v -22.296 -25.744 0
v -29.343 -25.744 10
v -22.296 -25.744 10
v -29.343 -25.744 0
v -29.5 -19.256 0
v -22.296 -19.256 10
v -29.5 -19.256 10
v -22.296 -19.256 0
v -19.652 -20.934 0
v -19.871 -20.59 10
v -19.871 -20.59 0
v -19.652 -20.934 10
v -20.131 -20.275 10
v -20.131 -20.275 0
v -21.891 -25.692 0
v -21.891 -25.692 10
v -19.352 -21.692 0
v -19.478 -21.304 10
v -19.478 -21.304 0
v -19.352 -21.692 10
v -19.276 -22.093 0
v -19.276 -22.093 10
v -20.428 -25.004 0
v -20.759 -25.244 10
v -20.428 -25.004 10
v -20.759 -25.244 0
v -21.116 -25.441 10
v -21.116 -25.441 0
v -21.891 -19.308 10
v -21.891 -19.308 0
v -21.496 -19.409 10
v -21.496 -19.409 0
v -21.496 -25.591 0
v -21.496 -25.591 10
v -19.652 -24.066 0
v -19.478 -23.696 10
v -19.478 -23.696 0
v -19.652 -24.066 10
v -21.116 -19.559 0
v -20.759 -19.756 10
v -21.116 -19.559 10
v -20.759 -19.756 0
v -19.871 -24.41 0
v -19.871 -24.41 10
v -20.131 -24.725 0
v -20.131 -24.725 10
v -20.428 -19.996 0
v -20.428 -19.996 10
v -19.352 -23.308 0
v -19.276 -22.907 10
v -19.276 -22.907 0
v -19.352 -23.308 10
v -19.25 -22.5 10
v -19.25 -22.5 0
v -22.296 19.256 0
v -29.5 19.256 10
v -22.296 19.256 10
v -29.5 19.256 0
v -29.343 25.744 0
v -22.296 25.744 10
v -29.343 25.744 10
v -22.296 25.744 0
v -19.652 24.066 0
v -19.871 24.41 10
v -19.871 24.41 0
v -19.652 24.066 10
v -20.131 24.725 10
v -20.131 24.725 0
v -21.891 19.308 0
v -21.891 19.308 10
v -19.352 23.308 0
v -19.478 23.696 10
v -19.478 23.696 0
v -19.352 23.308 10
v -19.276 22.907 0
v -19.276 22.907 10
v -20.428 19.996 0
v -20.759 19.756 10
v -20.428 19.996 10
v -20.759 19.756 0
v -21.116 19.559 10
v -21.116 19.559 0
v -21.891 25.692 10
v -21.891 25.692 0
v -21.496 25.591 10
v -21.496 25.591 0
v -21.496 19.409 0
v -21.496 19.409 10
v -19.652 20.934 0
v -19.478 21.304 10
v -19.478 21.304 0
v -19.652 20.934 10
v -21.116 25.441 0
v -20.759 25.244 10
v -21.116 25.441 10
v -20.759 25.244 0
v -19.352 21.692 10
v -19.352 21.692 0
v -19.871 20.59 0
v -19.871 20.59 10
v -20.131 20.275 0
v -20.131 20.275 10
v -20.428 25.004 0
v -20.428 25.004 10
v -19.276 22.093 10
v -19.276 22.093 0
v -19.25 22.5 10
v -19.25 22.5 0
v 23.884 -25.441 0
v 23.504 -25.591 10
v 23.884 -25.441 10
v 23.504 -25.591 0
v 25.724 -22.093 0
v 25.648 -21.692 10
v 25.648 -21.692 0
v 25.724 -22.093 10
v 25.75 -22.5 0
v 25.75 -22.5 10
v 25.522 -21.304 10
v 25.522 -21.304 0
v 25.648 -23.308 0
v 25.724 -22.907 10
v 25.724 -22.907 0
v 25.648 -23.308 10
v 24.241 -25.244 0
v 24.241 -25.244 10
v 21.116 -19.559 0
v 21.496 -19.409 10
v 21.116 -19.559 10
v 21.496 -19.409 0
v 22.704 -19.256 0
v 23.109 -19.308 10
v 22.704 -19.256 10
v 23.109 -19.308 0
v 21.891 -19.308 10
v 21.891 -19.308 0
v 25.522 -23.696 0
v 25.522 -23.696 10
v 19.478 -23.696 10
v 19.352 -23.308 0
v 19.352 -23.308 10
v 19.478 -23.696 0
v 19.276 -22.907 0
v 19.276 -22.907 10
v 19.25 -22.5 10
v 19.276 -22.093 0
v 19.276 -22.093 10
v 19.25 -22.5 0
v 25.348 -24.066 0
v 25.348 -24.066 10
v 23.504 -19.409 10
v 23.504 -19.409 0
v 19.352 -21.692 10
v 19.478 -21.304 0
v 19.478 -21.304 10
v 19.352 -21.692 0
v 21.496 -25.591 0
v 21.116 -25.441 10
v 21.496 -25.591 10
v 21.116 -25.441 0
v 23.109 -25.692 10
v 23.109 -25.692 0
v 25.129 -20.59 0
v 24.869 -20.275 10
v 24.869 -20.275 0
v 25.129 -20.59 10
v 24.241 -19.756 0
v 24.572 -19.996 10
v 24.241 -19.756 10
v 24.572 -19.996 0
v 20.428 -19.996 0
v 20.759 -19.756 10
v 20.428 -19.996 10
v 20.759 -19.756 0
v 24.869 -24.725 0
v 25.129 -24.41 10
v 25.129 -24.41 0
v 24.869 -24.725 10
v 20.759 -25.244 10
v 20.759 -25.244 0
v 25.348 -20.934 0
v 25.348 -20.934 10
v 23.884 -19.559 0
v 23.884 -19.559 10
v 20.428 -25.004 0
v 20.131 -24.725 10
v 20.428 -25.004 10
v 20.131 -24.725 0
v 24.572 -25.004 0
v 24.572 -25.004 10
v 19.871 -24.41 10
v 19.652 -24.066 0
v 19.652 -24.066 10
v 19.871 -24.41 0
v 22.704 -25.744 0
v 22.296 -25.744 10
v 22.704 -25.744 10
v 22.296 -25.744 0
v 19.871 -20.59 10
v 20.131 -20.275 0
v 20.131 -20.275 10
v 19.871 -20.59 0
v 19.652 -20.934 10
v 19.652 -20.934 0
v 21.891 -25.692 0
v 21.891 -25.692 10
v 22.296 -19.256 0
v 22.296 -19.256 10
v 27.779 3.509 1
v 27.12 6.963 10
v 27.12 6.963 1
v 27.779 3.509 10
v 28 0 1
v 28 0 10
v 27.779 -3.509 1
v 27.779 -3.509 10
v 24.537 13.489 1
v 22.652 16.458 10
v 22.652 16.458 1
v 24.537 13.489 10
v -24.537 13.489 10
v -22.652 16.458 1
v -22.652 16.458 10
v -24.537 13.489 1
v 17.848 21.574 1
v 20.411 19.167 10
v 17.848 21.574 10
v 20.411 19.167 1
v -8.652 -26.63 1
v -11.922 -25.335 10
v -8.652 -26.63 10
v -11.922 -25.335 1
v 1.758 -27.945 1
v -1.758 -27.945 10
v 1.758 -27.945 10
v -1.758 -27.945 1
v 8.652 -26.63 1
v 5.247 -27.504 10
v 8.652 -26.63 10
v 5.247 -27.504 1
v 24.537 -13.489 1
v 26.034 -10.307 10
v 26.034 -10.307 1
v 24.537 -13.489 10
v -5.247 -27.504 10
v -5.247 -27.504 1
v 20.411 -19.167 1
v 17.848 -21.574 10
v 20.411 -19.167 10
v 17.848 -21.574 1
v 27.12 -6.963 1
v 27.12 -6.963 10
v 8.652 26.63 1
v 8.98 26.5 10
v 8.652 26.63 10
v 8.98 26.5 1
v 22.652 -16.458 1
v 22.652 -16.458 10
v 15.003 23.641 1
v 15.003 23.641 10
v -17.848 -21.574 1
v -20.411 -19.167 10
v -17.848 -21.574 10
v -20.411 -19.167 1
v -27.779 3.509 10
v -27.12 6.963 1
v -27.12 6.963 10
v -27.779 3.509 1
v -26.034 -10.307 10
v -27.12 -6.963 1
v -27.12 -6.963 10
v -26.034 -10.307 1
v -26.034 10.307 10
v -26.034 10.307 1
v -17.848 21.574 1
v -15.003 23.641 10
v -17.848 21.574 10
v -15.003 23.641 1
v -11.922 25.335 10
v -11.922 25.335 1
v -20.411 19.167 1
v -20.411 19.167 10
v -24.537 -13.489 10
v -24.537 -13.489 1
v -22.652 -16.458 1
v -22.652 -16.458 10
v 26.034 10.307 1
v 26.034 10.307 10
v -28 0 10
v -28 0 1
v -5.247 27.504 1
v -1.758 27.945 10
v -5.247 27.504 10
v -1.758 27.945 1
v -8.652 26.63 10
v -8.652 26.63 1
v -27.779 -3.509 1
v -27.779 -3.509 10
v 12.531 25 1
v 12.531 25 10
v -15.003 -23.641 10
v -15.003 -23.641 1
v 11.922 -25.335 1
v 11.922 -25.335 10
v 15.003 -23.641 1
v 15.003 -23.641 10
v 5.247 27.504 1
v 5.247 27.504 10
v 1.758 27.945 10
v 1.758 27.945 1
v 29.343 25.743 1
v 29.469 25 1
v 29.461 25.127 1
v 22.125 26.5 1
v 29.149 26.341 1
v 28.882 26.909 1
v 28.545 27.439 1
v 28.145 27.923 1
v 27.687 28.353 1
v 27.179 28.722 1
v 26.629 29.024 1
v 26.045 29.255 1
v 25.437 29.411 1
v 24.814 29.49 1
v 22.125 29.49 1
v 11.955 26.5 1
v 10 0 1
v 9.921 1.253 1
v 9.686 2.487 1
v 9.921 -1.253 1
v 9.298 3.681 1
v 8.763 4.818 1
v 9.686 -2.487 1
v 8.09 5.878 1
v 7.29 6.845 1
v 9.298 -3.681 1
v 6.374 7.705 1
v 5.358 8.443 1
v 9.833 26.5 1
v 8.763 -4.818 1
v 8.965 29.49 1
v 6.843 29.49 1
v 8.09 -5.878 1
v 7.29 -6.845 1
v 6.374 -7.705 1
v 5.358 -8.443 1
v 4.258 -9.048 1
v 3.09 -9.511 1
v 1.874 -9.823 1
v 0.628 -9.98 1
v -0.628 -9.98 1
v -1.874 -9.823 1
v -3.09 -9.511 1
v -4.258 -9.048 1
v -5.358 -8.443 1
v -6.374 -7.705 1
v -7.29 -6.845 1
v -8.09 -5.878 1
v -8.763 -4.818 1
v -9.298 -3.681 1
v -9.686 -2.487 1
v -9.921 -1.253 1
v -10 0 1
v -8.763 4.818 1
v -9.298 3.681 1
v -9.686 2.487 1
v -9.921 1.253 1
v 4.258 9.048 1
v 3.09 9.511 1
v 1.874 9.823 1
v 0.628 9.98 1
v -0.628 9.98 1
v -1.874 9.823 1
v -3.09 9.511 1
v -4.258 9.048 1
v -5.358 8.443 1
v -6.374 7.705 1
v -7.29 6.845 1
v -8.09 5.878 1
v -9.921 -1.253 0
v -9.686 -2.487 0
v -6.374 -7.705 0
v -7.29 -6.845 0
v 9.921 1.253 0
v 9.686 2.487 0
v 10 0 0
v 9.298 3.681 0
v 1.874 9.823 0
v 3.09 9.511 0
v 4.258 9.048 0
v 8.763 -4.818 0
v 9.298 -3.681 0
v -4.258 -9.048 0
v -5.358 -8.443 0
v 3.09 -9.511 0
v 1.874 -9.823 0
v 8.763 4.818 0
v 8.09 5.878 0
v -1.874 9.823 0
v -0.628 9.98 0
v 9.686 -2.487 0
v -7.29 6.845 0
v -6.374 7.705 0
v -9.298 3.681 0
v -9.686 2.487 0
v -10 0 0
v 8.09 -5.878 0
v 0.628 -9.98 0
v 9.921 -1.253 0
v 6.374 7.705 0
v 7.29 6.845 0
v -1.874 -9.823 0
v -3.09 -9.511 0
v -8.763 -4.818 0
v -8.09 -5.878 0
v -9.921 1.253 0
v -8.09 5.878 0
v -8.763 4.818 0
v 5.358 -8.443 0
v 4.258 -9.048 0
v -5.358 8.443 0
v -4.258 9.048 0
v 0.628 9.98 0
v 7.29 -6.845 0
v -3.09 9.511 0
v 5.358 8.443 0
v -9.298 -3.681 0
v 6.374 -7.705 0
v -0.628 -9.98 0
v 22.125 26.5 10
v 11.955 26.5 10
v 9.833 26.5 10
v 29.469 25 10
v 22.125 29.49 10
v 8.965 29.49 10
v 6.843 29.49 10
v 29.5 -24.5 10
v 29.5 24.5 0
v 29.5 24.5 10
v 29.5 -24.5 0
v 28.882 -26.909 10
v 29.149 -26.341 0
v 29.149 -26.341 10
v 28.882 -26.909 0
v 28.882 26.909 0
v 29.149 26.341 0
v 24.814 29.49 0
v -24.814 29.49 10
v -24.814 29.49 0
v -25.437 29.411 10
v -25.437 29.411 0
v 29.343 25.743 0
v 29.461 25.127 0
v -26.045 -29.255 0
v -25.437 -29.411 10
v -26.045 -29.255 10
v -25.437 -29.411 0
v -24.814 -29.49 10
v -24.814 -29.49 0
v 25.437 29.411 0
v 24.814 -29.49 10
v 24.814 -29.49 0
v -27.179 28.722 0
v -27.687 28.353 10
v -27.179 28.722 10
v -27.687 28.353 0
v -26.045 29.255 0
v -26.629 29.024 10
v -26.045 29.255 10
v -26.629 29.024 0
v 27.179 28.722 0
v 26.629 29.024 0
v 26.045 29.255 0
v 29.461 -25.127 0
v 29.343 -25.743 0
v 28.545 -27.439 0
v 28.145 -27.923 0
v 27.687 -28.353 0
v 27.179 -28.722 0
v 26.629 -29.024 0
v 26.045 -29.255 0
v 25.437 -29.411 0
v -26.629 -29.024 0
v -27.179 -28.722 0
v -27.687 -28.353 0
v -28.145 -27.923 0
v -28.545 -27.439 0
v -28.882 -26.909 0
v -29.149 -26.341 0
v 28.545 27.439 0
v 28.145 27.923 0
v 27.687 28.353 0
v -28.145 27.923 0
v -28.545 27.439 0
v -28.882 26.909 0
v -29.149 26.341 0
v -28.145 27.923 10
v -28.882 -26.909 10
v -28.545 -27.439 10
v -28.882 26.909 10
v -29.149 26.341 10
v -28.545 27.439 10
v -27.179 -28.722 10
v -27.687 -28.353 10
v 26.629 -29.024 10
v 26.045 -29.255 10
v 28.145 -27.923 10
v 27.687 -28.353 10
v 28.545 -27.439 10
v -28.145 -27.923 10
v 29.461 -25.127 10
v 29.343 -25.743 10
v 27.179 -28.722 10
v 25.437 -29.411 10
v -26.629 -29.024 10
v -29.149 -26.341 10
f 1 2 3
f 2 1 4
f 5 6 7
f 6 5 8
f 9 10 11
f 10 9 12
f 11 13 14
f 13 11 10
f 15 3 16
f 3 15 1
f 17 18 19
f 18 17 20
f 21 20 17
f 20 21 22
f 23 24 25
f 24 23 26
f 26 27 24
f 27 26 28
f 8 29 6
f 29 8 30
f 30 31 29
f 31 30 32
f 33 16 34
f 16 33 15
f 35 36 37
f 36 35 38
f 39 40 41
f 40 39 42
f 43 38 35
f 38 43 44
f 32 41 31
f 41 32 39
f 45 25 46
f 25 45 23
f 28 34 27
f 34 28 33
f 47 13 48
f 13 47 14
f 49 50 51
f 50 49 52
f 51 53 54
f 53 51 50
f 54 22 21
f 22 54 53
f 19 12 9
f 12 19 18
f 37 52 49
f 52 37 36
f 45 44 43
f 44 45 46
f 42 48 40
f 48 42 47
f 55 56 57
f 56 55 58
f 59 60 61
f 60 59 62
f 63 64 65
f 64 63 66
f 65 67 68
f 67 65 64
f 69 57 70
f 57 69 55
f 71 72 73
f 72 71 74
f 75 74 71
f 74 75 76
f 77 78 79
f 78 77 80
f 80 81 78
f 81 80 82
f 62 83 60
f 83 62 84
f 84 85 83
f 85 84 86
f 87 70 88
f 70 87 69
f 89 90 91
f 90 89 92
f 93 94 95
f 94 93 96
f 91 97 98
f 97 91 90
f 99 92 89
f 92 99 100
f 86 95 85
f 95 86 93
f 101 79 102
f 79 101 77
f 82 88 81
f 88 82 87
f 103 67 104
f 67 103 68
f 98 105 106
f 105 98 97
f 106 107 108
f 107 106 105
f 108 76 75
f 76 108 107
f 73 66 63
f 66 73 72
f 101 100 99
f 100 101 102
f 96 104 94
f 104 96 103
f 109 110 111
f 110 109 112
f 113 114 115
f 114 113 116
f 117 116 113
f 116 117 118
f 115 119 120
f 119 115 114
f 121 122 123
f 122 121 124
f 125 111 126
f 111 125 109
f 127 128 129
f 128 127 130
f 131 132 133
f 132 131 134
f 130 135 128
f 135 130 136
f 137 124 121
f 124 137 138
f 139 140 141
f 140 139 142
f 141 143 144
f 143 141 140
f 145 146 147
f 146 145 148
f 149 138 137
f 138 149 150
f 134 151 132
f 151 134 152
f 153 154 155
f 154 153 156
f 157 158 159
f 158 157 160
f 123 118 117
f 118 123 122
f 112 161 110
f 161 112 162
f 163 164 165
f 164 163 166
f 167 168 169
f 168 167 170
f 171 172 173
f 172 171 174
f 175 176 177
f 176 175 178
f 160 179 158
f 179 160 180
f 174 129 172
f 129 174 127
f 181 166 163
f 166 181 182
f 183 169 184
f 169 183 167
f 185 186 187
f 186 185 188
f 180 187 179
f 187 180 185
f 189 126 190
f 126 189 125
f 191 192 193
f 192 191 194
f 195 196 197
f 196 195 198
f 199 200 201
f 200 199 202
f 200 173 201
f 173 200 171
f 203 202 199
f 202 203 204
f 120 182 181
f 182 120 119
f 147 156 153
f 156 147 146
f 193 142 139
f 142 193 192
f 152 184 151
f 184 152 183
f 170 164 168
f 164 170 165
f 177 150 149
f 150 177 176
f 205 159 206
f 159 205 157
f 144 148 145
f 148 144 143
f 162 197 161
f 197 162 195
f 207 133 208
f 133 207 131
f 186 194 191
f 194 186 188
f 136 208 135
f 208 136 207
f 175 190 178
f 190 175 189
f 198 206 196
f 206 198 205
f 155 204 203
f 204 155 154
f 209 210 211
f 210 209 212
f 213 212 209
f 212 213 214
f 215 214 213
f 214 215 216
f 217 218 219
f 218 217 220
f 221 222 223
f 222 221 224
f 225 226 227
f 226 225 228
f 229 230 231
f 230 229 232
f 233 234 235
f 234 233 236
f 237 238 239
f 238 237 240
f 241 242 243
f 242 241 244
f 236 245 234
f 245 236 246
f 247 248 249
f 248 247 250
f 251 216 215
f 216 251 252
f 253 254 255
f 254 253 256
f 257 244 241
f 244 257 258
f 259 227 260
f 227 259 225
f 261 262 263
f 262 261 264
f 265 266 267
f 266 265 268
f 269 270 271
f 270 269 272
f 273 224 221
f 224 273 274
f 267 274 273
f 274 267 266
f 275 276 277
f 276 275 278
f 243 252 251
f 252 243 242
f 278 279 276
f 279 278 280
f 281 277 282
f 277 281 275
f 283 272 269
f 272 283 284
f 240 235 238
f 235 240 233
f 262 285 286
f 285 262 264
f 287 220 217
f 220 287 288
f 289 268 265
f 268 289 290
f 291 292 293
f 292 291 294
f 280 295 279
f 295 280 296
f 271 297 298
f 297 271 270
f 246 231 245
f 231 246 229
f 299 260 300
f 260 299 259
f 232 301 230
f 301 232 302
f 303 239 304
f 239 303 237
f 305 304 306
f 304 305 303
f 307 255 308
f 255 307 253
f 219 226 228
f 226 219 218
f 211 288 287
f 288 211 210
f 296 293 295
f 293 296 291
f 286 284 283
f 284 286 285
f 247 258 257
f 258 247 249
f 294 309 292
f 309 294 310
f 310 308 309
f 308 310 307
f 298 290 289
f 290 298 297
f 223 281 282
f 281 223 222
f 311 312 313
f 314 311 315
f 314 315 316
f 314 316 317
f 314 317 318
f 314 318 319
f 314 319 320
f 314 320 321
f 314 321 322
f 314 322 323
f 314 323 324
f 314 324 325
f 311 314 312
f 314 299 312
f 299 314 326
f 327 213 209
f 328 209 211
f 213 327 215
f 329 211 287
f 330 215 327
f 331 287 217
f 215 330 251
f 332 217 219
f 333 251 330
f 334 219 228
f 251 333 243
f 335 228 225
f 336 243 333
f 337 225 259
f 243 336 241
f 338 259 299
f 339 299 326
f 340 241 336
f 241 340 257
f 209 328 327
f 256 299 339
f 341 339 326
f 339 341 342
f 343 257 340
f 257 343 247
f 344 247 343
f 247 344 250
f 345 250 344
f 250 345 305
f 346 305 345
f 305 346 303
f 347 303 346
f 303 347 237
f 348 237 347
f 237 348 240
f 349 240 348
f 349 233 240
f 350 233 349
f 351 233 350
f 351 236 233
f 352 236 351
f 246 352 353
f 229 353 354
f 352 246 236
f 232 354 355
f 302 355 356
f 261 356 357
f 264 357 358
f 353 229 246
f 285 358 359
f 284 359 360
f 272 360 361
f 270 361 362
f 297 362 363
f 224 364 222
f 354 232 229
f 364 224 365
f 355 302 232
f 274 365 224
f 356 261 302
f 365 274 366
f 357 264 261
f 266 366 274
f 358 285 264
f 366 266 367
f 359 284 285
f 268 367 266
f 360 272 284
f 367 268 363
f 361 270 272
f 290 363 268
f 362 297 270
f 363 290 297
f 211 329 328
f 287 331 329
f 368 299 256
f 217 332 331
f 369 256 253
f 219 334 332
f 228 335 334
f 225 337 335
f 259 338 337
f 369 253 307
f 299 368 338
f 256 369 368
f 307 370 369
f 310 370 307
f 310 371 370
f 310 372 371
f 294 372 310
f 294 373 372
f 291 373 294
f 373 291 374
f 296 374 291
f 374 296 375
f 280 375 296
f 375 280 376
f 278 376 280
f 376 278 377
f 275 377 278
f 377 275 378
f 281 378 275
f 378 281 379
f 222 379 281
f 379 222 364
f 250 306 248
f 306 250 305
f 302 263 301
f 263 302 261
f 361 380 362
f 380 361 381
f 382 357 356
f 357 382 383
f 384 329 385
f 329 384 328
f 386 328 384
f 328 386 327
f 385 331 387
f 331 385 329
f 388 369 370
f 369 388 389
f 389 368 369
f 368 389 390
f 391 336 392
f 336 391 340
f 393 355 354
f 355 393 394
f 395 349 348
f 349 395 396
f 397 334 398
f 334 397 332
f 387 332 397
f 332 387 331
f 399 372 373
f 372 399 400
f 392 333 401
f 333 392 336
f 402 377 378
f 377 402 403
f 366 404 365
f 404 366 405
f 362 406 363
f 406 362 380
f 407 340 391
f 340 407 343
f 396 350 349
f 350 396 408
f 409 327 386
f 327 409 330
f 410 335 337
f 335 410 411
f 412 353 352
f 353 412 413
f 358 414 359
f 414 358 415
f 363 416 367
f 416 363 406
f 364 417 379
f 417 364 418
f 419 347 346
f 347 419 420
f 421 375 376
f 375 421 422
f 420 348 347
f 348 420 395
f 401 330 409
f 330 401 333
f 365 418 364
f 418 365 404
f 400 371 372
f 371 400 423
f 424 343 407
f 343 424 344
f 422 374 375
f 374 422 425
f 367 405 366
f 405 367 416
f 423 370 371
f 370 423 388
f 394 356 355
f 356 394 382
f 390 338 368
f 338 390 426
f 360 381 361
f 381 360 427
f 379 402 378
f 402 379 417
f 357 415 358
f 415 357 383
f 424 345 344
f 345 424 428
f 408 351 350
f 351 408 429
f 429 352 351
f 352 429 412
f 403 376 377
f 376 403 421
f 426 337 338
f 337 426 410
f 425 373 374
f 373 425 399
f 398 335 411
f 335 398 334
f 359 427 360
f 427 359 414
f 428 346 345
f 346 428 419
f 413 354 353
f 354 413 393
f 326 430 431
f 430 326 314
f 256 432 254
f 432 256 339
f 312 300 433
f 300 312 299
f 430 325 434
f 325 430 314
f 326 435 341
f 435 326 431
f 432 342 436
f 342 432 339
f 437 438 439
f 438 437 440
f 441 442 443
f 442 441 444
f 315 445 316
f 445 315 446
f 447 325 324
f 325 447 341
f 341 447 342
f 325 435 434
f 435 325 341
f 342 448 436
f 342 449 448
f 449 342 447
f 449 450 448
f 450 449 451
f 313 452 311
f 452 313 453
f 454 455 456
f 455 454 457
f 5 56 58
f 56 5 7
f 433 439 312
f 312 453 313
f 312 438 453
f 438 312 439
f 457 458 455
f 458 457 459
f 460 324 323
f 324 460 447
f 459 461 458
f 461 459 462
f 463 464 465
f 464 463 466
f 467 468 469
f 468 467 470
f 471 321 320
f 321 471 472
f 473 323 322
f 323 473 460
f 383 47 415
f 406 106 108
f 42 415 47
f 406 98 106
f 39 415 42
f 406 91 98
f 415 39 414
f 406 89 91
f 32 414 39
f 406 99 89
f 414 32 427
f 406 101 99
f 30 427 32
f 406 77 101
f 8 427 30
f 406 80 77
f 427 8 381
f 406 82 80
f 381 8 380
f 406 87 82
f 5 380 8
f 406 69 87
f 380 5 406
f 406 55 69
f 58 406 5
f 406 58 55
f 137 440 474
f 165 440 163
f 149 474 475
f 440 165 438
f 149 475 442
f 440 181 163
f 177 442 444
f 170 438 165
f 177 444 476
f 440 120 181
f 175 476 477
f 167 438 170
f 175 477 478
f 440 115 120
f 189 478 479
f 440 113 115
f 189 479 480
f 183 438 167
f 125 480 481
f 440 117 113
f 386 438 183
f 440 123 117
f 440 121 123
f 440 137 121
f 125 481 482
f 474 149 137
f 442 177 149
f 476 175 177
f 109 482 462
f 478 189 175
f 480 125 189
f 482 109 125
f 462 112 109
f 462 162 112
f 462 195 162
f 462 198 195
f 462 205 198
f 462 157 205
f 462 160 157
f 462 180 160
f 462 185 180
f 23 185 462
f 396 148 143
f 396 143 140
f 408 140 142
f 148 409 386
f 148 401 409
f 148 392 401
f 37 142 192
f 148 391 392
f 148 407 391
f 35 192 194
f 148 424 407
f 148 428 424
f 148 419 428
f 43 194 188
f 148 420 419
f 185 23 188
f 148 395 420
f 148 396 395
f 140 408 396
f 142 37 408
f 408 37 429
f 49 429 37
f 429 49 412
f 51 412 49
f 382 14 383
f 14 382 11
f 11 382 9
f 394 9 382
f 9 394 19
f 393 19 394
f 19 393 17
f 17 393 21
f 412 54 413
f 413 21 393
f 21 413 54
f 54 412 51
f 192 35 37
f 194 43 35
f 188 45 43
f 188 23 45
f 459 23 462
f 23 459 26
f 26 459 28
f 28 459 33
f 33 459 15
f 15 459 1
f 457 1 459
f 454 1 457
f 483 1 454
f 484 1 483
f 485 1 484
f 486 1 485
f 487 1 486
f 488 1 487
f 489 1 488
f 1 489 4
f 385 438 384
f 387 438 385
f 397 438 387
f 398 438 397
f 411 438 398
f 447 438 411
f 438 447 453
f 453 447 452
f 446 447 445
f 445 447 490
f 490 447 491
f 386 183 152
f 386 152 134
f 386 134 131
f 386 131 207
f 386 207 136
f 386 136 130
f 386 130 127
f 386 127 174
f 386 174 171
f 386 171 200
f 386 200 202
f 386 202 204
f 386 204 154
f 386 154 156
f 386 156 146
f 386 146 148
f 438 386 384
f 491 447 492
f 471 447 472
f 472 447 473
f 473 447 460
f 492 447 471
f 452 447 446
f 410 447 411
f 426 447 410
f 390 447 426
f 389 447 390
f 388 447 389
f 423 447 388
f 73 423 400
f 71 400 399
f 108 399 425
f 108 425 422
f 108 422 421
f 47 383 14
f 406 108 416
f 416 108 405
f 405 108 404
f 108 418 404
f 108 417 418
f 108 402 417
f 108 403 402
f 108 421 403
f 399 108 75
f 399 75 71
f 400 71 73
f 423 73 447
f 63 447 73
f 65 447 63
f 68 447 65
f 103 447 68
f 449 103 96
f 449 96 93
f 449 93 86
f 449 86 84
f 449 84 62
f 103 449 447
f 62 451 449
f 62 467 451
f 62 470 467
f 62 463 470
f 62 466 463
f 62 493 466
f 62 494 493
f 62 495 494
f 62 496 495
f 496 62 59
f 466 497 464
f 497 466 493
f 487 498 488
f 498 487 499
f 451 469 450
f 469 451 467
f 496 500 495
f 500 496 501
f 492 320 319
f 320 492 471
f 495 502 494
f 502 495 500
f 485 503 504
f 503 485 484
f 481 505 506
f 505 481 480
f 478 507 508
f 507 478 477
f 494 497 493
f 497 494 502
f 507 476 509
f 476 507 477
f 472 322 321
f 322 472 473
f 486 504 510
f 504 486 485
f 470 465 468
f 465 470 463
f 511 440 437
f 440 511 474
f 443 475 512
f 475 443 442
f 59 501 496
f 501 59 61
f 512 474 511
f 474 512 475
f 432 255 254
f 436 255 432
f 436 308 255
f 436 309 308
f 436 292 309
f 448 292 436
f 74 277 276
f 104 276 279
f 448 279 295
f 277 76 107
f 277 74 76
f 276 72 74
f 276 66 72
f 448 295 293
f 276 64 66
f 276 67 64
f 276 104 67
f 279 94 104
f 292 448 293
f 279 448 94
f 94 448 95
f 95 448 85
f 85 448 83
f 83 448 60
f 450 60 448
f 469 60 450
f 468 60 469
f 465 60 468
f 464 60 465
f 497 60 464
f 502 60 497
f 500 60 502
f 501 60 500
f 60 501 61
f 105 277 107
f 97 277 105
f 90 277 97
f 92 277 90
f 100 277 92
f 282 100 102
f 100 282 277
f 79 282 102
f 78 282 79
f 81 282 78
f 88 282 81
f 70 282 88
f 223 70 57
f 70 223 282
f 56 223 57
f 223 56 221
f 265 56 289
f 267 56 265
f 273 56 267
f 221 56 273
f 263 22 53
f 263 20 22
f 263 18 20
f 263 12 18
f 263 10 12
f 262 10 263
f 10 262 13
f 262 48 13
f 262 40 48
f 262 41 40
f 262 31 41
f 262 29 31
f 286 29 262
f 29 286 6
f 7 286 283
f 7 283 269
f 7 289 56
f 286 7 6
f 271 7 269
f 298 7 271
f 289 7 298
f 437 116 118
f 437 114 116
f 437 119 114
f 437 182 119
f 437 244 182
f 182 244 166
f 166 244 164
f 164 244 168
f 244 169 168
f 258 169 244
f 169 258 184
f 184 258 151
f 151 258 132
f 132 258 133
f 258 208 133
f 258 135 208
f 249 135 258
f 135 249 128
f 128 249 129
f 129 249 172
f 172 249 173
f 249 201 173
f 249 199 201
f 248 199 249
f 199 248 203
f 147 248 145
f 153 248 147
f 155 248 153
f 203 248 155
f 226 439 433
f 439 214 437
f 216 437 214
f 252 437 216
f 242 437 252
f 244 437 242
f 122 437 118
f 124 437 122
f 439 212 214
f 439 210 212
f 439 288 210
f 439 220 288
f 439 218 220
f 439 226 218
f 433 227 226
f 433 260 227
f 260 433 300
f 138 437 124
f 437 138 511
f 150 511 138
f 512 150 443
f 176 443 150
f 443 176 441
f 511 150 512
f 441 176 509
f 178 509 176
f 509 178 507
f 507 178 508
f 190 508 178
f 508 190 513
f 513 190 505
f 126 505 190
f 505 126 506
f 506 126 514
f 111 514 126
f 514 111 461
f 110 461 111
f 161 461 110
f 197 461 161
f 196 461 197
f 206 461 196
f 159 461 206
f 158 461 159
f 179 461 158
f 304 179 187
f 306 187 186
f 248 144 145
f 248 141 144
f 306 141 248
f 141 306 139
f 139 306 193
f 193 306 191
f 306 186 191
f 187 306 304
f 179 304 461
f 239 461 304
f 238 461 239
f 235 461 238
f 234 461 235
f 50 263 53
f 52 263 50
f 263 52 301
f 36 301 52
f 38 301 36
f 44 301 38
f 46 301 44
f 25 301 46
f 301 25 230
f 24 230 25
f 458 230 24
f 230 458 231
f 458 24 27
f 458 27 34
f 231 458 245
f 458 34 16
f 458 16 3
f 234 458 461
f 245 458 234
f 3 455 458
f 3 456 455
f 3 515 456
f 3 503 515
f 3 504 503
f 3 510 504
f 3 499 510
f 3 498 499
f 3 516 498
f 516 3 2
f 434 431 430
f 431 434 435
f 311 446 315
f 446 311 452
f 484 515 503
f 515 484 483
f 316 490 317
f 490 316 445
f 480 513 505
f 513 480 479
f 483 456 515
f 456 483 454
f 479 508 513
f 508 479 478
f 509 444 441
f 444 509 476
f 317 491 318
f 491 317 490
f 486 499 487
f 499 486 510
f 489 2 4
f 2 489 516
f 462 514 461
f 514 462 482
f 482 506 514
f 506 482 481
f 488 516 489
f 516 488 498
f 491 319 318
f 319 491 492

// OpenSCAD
$fn = 50;


difference() {
	union() {
		translate(v = [0, 0, 0]) {
			rotate(a = [0, 0, 0]) {
				hull() {
					translate(v = [-24.5000000000, 24.5000000000, 0]) {
						rotate(a = [0, 0, 0]) {
							translate(v = [0, 0, 0]) {
								rotate(a = [0, 0, 0]) {
									cylinder(h = 10, r = 5);
								}
							}
						}
					}
					translate(v = [24.5000000000, 24.5000000000, 0]) {
						rotate(a = [0, 0, 0]) {
							translate(v = [0, 0, 0]) {
								rotate(a = [0, 0, 0]) {
									cylinder(h = 10, r = 5);
								}
							}
						}
					}
					translate(v = [-24.5000000000, -24.5000000000, 0]) {
						rotate(a = [0, 0, 0]) {
							translate(v = [0, 0, 0]) {
								rotate(a = [0, 0, 0]) {
									cylinder(h = 10, r = 5);
								}
							}
						}
					}
					translate(v = [24.5000000000, -24.5000000000, 0]) {
						rotate(a = [0, 0, 0]) {
							translate(v = [0, 0, 0]) {
								rotate(a = [0, 0, 0]) {
									cylinder(h = 10, r = 5);
								}
							}
						}
					}
				}
			}
		}
	}
	union() {
		translate(v = [-30.0000000000, -22.5000000000, -125]) {
			rotate(a = [0, 0, 0]) {
				hull() {
					translate(v = [7.5000000000, 0, 0]) {
						rotate(a = [0, 0, 0]) {
							translate(v = [0, 0, 0]) {
								rotate(a = [0, 0, 0]) {
									cylinder(h = 250, r = 3.2500000000);
								}
							}
						}
					}
					translate(v = [-7.5000000000, 0, 0]) {
						rotate(a = [0, 0, 0]) {
							translate(v = [0, 0, 0]) {
								rotate(a = [0, 0, 0]) {
									cylinder(h = 250, r = 3.2500000000);
								}
							}
						}
					}
				}
			}
		}
		translate(v = [-30.0000000000, 22.5000000000, -125]) {
			rotate(a = [0, 0, 0]) {
				hull() {
					translate(v = [7.5000000000, 0, 0]) {
						rotate(a = [0, 0, 0]) {
							translate(v = [0, 0, 0]) {
								rotate(a = [0, 0, 0]) {
									cylinder(h = 250, r = 3.2500000000);
								}
							}
						}
					}
					translate(v = [-7.5000000000, 0, 0]) {
						rotate(a = [0, 0, 0]) {
							translate(v = [0, 0, 0]) {
								rotate(a = [0, 0, 0]) {
									cylinder(h = 250, r = 3.2500000000);
								}
							}
						}
					}
				}
			}
		}
		translate(v = [22.5000000000, -22.5000000000, -125.0000000000]) {
			rotate(a = [0, 0, 0]) {
				cylinder(h = 250, r = 3.2500000000);
			}
		}
		translate(v = [0, 0, 1.0000000000]) {
			rotate(a = [0, 0, 0]) {
				cylinder(h = 12, r = 28.0000000000);
			}
		}
		translate(v = [0, 0, -5.0000000000]) {
			rotate(a = [0, 0, 0]) {
				cylinder(h = 10, r = 10.0000000000);
			}
		}
		translate(v = [0.0000000000, 25.0000000000, 1]) {
			rotate(a = [0, 0, 0]) {
				cube(size = [29.5000000000, 1.5000000000, 12]);
			}
		}
		translate(v = [22.1250000000, 25.0000000000, 1]) {
			rotate(a = [0, 0, 0]) {
				cube(size = [7.3750000000, 4.5000000000, 12]);
			}
		}
		translate(v = [6.0833333333, 30.2500000000, 1]) {
			rotate(a = [0, 0, -45]) {
				cube(size = [7.5000000000, 1.5000000000, 12]);
			}
		}
	}
}
